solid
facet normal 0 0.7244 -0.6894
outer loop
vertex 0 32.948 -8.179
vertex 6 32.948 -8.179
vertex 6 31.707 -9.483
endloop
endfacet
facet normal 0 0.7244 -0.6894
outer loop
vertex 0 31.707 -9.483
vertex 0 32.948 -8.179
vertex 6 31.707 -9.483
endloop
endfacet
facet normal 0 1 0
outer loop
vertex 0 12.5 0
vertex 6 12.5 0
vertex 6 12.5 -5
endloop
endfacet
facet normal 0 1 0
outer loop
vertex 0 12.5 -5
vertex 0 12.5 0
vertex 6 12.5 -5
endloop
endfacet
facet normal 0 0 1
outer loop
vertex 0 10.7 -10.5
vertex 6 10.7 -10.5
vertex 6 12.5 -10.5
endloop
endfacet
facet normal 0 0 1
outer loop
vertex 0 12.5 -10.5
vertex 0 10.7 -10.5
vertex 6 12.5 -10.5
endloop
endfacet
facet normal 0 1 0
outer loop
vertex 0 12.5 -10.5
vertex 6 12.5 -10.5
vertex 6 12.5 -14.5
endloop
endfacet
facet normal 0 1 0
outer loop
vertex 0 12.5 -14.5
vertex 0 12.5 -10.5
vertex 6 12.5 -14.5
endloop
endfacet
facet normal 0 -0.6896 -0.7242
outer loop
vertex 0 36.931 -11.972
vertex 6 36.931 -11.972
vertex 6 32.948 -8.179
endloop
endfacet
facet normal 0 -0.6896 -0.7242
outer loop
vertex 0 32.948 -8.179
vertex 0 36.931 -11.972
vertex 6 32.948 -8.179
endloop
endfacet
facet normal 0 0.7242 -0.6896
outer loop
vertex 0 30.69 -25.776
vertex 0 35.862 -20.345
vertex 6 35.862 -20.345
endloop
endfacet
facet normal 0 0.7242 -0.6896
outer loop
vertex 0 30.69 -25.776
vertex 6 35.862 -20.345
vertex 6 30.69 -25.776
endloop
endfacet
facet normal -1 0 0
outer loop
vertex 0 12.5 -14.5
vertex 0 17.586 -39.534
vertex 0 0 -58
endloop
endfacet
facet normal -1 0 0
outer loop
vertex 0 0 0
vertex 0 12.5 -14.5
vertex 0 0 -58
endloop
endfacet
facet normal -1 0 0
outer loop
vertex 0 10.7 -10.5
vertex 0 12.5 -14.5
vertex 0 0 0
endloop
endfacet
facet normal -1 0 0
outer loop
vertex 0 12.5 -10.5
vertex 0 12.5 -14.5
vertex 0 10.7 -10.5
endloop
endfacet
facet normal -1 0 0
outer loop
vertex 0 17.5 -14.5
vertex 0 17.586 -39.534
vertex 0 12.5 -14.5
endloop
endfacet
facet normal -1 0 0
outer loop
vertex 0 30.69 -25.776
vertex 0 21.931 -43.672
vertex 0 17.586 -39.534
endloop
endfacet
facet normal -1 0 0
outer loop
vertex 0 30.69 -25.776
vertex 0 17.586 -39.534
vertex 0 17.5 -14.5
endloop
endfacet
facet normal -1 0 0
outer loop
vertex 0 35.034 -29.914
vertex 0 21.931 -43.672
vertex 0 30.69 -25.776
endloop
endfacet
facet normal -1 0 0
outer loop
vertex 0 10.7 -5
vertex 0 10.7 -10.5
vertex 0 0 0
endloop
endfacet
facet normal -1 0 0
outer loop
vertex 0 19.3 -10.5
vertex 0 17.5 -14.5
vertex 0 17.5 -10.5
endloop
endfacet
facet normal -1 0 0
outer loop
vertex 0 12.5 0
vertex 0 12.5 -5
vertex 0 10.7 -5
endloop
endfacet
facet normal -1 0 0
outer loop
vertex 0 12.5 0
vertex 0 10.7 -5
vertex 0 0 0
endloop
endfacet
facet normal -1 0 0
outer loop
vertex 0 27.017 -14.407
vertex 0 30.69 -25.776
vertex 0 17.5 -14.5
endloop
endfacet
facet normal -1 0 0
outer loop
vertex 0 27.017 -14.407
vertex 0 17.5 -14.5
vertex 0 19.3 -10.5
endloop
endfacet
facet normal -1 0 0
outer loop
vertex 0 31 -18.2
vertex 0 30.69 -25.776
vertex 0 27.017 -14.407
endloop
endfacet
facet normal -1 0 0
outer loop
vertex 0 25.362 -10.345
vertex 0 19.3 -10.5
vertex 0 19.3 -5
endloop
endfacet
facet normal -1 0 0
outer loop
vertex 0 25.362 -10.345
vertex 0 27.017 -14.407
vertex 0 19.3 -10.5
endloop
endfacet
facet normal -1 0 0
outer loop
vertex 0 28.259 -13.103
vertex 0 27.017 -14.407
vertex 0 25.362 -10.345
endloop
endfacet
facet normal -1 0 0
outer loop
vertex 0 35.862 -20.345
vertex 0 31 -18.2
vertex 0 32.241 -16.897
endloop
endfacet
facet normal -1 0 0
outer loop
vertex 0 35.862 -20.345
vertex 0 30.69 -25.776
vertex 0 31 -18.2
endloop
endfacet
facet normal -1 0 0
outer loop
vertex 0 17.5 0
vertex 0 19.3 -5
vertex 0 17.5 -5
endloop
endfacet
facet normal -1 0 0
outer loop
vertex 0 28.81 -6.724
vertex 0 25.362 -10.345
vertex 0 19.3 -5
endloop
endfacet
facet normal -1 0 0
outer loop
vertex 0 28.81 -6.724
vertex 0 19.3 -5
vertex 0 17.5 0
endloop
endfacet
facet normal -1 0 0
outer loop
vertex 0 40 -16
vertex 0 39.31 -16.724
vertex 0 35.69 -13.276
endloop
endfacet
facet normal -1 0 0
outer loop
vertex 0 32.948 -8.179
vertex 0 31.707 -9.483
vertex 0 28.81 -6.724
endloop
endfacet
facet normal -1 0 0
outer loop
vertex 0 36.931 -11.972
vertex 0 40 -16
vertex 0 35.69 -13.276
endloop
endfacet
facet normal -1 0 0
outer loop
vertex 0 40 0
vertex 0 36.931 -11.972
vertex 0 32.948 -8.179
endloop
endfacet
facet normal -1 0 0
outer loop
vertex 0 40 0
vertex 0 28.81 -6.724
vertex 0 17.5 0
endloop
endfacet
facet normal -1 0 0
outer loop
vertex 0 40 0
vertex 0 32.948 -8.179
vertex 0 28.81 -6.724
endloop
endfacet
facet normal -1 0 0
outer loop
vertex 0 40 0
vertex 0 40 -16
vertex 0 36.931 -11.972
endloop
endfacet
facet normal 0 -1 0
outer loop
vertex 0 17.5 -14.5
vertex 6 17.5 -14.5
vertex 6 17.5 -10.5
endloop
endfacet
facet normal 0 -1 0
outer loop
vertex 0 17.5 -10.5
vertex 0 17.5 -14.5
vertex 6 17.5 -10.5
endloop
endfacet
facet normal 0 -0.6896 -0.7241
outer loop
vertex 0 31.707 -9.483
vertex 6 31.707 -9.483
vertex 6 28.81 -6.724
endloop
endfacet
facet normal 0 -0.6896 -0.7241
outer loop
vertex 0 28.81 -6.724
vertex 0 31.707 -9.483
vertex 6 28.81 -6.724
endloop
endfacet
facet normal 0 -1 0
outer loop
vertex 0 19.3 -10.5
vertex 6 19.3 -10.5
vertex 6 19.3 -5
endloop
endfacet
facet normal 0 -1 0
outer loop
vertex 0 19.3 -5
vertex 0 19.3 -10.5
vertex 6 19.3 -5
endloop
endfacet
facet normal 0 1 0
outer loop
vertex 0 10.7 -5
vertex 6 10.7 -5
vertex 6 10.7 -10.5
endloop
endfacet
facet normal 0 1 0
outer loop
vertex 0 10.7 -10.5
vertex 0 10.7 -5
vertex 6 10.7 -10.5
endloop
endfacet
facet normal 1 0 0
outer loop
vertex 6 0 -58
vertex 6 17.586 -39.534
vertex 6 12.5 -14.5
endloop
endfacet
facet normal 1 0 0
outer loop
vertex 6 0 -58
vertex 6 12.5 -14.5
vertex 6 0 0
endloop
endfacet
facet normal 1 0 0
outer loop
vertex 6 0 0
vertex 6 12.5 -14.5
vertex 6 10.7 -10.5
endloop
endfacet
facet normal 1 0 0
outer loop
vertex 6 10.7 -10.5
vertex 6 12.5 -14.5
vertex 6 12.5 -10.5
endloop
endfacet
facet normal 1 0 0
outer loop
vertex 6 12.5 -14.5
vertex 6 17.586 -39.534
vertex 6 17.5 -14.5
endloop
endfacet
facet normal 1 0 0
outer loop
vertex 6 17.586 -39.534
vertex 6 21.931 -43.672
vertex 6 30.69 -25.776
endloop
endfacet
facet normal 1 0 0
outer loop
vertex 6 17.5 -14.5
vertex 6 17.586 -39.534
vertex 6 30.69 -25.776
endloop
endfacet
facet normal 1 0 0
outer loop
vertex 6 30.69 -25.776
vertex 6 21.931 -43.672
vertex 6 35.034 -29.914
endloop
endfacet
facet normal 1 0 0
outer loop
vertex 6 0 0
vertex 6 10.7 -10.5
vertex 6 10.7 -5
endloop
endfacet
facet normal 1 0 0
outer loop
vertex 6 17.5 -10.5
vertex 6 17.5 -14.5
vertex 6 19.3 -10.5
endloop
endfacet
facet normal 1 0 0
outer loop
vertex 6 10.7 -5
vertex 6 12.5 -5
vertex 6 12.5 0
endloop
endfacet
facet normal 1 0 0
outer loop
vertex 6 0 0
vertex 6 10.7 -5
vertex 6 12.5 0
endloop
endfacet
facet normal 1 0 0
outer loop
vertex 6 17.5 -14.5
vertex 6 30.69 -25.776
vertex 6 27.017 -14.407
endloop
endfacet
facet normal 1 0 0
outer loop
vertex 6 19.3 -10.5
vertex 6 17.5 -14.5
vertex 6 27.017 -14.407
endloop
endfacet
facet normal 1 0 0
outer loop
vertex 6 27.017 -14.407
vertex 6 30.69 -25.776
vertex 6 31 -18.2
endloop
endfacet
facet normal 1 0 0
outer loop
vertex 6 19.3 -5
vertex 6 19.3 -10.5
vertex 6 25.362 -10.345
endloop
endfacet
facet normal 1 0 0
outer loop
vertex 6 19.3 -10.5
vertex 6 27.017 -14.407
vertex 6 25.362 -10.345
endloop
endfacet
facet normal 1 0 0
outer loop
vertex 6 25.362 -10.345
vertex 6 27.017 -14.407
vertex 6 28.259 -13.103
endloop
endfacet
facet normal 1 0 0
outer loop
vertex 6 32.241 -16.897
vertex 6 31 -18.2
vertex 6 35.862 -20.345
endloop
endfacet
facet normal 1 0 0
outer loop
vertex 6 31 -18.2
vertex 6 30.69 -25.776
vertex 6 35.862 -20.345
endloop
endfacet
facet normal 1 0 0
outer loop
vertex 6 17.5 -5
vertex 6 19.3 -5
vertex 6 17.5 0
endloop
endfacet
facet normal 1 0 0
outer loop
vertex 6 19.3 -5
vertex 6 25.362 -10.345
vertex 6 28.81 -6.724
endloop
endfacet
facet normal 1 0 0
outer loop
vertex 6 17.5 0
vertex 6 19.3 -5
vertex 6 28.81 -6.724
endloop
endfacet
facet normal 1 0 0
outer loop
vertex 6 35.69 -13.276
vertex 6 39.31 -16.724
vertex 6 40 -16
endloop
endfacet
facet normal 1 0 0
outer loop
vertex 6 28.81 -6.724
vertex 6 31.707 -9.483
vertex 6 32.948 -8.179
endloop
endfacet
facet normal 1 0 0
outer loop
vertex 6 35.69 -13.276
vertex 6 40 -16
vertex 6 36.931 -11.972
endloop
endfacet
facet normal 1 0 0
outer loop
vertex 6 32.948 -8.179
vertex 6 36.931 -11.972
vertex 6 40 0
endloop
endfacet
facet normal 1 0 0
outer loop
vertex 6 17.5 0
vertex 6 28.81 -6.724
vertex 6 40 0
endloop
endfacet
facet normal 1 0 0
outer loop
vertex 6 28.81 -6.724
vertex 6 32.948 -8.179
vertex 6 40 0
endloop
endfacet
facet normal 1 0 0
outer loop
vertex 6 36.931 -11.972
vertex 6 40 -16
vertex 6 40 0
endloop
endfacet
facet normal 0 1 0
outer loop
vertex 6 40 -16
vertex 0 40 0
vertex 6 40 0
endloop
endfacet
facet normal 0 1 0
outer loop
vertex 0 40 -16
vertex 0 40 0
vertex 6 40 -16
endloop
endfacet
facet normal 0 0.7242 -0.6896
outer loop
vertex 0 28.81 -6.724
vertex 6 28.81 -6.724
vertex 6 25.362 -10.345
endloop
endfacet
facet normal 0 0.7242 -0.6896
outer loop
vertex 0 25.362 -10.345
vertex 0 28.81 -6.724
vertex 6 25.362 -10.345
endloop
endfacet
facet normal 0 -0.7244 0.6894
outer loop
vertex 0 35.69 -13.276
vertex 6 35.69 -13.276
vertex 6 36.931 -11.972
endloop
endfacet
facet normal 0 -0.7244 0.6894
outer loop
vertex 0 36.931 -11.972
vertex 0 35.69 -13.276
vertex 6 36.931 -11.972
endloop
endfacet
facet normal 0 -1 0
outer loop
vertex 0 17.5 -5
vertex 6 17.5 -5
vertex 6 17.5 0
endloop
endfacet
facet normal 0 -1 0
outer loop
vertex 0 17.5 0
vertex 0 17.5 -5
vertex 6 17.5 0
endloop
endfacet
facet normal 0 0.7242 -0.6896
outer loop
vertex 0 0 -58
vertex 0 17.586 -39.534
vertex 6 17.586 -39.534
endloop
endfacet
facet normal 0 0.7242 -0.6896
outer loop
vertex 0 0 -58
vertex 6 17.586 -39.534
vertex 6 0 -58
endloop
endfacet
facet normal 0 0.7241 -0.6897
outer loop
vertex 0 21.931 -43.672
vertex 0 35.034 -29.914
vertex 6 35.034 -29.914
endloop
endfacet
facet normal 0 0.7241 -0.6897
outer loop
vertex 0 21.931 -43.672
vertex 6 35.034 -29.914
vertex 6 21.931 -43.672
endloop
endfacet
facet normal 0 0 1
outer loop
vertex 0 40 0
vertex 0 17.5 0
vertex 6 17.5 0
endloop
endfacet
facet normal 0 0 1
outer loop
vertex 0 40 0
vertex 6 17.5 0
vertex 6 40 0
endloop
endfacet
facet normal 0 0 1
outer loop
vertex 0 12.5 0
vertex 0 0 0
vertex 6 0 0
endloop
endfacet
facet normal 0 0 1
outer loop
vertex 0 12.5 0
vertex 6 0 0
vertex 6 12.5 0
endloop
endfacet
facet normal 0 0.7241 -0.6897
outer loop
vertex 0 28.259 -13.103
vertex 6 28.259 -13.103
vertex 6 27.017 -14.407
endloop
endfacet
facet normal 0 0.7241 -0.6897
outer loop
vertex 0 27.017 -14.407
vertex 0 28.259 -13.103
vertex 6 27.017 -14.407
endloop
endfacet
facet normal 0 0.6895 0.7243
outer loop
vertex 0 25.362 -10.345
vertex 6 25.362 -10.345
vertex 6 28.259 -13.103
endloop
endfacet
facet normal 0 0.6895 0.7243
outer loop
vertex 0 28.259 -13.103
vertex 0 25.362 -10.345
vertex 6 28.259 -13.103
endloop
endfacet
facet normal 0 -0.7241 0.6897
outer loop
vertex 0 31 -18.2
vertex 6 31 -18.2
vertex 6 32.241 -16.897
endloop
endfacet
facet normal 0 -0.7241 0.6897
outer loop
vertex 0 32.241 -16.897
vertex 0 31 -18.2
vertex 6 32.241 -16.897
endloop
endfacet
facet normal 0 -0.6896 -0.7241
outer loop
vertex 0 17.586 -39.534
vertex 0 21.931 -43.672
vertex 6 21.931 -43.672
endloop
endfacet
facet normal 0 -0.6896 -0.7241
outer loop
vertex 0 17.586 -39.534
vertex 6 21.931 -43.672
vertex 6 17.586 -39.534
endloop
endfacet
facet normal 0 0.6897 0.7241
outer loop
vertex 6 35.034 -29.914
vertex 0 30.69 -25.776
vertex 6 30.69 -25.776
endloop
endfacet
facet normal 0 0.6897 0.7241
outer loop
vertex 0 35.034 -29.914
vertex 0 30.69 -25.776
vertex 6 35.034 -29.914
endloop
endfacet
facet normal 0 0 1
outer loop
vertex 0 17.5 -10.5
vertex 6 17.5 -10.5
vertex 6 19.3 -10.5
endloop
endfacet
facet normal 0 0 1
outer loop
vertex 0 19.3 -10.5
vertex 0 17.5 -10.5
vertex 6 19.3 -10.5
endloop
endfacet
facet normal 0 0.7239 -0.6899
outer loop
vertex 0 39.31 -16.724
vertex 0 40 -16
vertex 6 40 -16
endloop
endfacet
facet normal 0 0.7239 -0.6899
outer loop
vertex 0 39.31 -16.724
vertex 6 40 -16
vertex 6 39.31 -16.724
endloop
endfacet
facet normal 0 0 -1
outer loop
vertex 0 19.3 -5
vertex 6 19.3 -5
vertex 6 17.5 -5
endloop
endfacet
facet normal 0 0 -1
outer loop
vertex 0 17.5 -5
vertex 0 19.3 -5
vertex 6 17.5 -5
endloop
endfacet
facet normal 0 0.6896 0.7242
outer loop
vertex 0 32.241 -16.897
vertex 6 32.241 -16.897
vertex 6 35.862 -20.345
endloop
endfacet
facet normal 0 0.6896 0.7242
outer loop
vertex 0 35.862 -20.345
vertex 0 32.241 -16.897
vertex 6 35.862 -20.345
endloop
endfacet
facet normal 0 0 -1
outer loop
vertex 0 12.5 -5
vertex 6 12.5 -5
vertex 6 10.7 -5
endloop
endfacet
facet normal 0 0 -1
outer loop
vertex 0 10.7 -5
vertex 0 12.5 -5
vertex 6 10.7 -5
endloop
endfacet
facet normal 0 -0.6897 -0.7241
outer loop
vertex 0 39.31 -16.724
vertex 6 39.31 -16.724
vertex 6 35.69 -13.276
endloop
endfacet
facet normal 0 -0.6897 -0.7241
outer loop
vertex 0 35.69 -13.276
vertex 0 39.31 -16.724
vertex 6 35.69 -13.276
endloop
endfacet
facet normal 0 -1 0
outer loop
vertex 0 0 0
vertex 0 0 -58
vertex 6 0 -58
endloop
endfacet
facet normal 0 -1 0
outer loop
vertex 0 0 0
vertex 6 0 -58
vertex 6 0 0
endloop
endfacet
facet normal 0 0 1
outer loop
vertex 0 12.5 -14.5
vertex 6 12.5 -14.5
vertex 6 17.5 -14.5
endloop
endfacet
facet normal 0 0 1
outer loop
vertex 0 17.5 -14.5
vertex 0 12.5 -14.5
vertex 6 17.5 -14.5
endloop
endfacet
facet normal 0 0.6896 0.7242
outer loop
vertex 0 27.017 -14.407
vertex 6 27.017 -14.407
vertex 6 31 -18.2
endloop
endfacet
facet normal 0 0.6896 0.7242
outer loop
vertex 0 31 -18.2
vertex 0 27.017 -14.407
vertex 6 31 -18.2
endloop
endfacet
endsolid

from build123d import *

# Parameters (mm, degrees)
BOSS_EXTRU_1_DEPTH      = 6
ENL_V_MAT_EXTRU_1_DEPTH = 6


with BuildPart() as part:
    # Esquisse1 → Boss.-Extru.1 (new body)
    with BuildSketch(Plane(origin=(0, 0, 0), x_dir=(0, 0, -1), z_dir=(1, 0, 0))):
        Polygon((0, 0), (0, 40), (16, 40), (25.775862069, 30.689655172), (29.913793103, 35.034482759), (43.672413793, 21.931034483), (39.534482759, 17.586206897), (58, 0), align=None)
    extrude(amount=BOSS_EXTRU_1_DEPTH)

    # Esquisse2 → Enlèv. mat.-Extru.1 (cut)
    with BuildSketch(Plane(origin=(6, 0, 0), x_dir=(0, 0, -1), z_dir=(1, 0, 0))):
        Polygon((0, 17.5), (0, 12.5), (5, 12.5), (5, 10.7), (10.5, 10.7), (10.5, 12.5), (14.5, 12.5), (14.5, 17.5), (10.5, 17.5), (10.5, 19.3), (5, 19.3), (5, 17.5), align=None)
        Polygon((20.344827586, 35.862068966), (16.724137931, 39.310344828), (13.275862069, 35.689655172), (11.972413793, 36.931034483), (8.179310345, 32.948275862), (9.482758621, 31.706896552), (6.724137931, 28.810344828), (10.344827586, 25.362068966), (13.103448276, 28.25862069), (14.406896552, 27.017241379), (18.2, 31), (16.896551724, 32.24137931), align=None)
    extrude(amount=-ENL_V_MAT_EXTRU_1_DEPTH, mode=Mode.SUBTRACT)


solid = part.part
